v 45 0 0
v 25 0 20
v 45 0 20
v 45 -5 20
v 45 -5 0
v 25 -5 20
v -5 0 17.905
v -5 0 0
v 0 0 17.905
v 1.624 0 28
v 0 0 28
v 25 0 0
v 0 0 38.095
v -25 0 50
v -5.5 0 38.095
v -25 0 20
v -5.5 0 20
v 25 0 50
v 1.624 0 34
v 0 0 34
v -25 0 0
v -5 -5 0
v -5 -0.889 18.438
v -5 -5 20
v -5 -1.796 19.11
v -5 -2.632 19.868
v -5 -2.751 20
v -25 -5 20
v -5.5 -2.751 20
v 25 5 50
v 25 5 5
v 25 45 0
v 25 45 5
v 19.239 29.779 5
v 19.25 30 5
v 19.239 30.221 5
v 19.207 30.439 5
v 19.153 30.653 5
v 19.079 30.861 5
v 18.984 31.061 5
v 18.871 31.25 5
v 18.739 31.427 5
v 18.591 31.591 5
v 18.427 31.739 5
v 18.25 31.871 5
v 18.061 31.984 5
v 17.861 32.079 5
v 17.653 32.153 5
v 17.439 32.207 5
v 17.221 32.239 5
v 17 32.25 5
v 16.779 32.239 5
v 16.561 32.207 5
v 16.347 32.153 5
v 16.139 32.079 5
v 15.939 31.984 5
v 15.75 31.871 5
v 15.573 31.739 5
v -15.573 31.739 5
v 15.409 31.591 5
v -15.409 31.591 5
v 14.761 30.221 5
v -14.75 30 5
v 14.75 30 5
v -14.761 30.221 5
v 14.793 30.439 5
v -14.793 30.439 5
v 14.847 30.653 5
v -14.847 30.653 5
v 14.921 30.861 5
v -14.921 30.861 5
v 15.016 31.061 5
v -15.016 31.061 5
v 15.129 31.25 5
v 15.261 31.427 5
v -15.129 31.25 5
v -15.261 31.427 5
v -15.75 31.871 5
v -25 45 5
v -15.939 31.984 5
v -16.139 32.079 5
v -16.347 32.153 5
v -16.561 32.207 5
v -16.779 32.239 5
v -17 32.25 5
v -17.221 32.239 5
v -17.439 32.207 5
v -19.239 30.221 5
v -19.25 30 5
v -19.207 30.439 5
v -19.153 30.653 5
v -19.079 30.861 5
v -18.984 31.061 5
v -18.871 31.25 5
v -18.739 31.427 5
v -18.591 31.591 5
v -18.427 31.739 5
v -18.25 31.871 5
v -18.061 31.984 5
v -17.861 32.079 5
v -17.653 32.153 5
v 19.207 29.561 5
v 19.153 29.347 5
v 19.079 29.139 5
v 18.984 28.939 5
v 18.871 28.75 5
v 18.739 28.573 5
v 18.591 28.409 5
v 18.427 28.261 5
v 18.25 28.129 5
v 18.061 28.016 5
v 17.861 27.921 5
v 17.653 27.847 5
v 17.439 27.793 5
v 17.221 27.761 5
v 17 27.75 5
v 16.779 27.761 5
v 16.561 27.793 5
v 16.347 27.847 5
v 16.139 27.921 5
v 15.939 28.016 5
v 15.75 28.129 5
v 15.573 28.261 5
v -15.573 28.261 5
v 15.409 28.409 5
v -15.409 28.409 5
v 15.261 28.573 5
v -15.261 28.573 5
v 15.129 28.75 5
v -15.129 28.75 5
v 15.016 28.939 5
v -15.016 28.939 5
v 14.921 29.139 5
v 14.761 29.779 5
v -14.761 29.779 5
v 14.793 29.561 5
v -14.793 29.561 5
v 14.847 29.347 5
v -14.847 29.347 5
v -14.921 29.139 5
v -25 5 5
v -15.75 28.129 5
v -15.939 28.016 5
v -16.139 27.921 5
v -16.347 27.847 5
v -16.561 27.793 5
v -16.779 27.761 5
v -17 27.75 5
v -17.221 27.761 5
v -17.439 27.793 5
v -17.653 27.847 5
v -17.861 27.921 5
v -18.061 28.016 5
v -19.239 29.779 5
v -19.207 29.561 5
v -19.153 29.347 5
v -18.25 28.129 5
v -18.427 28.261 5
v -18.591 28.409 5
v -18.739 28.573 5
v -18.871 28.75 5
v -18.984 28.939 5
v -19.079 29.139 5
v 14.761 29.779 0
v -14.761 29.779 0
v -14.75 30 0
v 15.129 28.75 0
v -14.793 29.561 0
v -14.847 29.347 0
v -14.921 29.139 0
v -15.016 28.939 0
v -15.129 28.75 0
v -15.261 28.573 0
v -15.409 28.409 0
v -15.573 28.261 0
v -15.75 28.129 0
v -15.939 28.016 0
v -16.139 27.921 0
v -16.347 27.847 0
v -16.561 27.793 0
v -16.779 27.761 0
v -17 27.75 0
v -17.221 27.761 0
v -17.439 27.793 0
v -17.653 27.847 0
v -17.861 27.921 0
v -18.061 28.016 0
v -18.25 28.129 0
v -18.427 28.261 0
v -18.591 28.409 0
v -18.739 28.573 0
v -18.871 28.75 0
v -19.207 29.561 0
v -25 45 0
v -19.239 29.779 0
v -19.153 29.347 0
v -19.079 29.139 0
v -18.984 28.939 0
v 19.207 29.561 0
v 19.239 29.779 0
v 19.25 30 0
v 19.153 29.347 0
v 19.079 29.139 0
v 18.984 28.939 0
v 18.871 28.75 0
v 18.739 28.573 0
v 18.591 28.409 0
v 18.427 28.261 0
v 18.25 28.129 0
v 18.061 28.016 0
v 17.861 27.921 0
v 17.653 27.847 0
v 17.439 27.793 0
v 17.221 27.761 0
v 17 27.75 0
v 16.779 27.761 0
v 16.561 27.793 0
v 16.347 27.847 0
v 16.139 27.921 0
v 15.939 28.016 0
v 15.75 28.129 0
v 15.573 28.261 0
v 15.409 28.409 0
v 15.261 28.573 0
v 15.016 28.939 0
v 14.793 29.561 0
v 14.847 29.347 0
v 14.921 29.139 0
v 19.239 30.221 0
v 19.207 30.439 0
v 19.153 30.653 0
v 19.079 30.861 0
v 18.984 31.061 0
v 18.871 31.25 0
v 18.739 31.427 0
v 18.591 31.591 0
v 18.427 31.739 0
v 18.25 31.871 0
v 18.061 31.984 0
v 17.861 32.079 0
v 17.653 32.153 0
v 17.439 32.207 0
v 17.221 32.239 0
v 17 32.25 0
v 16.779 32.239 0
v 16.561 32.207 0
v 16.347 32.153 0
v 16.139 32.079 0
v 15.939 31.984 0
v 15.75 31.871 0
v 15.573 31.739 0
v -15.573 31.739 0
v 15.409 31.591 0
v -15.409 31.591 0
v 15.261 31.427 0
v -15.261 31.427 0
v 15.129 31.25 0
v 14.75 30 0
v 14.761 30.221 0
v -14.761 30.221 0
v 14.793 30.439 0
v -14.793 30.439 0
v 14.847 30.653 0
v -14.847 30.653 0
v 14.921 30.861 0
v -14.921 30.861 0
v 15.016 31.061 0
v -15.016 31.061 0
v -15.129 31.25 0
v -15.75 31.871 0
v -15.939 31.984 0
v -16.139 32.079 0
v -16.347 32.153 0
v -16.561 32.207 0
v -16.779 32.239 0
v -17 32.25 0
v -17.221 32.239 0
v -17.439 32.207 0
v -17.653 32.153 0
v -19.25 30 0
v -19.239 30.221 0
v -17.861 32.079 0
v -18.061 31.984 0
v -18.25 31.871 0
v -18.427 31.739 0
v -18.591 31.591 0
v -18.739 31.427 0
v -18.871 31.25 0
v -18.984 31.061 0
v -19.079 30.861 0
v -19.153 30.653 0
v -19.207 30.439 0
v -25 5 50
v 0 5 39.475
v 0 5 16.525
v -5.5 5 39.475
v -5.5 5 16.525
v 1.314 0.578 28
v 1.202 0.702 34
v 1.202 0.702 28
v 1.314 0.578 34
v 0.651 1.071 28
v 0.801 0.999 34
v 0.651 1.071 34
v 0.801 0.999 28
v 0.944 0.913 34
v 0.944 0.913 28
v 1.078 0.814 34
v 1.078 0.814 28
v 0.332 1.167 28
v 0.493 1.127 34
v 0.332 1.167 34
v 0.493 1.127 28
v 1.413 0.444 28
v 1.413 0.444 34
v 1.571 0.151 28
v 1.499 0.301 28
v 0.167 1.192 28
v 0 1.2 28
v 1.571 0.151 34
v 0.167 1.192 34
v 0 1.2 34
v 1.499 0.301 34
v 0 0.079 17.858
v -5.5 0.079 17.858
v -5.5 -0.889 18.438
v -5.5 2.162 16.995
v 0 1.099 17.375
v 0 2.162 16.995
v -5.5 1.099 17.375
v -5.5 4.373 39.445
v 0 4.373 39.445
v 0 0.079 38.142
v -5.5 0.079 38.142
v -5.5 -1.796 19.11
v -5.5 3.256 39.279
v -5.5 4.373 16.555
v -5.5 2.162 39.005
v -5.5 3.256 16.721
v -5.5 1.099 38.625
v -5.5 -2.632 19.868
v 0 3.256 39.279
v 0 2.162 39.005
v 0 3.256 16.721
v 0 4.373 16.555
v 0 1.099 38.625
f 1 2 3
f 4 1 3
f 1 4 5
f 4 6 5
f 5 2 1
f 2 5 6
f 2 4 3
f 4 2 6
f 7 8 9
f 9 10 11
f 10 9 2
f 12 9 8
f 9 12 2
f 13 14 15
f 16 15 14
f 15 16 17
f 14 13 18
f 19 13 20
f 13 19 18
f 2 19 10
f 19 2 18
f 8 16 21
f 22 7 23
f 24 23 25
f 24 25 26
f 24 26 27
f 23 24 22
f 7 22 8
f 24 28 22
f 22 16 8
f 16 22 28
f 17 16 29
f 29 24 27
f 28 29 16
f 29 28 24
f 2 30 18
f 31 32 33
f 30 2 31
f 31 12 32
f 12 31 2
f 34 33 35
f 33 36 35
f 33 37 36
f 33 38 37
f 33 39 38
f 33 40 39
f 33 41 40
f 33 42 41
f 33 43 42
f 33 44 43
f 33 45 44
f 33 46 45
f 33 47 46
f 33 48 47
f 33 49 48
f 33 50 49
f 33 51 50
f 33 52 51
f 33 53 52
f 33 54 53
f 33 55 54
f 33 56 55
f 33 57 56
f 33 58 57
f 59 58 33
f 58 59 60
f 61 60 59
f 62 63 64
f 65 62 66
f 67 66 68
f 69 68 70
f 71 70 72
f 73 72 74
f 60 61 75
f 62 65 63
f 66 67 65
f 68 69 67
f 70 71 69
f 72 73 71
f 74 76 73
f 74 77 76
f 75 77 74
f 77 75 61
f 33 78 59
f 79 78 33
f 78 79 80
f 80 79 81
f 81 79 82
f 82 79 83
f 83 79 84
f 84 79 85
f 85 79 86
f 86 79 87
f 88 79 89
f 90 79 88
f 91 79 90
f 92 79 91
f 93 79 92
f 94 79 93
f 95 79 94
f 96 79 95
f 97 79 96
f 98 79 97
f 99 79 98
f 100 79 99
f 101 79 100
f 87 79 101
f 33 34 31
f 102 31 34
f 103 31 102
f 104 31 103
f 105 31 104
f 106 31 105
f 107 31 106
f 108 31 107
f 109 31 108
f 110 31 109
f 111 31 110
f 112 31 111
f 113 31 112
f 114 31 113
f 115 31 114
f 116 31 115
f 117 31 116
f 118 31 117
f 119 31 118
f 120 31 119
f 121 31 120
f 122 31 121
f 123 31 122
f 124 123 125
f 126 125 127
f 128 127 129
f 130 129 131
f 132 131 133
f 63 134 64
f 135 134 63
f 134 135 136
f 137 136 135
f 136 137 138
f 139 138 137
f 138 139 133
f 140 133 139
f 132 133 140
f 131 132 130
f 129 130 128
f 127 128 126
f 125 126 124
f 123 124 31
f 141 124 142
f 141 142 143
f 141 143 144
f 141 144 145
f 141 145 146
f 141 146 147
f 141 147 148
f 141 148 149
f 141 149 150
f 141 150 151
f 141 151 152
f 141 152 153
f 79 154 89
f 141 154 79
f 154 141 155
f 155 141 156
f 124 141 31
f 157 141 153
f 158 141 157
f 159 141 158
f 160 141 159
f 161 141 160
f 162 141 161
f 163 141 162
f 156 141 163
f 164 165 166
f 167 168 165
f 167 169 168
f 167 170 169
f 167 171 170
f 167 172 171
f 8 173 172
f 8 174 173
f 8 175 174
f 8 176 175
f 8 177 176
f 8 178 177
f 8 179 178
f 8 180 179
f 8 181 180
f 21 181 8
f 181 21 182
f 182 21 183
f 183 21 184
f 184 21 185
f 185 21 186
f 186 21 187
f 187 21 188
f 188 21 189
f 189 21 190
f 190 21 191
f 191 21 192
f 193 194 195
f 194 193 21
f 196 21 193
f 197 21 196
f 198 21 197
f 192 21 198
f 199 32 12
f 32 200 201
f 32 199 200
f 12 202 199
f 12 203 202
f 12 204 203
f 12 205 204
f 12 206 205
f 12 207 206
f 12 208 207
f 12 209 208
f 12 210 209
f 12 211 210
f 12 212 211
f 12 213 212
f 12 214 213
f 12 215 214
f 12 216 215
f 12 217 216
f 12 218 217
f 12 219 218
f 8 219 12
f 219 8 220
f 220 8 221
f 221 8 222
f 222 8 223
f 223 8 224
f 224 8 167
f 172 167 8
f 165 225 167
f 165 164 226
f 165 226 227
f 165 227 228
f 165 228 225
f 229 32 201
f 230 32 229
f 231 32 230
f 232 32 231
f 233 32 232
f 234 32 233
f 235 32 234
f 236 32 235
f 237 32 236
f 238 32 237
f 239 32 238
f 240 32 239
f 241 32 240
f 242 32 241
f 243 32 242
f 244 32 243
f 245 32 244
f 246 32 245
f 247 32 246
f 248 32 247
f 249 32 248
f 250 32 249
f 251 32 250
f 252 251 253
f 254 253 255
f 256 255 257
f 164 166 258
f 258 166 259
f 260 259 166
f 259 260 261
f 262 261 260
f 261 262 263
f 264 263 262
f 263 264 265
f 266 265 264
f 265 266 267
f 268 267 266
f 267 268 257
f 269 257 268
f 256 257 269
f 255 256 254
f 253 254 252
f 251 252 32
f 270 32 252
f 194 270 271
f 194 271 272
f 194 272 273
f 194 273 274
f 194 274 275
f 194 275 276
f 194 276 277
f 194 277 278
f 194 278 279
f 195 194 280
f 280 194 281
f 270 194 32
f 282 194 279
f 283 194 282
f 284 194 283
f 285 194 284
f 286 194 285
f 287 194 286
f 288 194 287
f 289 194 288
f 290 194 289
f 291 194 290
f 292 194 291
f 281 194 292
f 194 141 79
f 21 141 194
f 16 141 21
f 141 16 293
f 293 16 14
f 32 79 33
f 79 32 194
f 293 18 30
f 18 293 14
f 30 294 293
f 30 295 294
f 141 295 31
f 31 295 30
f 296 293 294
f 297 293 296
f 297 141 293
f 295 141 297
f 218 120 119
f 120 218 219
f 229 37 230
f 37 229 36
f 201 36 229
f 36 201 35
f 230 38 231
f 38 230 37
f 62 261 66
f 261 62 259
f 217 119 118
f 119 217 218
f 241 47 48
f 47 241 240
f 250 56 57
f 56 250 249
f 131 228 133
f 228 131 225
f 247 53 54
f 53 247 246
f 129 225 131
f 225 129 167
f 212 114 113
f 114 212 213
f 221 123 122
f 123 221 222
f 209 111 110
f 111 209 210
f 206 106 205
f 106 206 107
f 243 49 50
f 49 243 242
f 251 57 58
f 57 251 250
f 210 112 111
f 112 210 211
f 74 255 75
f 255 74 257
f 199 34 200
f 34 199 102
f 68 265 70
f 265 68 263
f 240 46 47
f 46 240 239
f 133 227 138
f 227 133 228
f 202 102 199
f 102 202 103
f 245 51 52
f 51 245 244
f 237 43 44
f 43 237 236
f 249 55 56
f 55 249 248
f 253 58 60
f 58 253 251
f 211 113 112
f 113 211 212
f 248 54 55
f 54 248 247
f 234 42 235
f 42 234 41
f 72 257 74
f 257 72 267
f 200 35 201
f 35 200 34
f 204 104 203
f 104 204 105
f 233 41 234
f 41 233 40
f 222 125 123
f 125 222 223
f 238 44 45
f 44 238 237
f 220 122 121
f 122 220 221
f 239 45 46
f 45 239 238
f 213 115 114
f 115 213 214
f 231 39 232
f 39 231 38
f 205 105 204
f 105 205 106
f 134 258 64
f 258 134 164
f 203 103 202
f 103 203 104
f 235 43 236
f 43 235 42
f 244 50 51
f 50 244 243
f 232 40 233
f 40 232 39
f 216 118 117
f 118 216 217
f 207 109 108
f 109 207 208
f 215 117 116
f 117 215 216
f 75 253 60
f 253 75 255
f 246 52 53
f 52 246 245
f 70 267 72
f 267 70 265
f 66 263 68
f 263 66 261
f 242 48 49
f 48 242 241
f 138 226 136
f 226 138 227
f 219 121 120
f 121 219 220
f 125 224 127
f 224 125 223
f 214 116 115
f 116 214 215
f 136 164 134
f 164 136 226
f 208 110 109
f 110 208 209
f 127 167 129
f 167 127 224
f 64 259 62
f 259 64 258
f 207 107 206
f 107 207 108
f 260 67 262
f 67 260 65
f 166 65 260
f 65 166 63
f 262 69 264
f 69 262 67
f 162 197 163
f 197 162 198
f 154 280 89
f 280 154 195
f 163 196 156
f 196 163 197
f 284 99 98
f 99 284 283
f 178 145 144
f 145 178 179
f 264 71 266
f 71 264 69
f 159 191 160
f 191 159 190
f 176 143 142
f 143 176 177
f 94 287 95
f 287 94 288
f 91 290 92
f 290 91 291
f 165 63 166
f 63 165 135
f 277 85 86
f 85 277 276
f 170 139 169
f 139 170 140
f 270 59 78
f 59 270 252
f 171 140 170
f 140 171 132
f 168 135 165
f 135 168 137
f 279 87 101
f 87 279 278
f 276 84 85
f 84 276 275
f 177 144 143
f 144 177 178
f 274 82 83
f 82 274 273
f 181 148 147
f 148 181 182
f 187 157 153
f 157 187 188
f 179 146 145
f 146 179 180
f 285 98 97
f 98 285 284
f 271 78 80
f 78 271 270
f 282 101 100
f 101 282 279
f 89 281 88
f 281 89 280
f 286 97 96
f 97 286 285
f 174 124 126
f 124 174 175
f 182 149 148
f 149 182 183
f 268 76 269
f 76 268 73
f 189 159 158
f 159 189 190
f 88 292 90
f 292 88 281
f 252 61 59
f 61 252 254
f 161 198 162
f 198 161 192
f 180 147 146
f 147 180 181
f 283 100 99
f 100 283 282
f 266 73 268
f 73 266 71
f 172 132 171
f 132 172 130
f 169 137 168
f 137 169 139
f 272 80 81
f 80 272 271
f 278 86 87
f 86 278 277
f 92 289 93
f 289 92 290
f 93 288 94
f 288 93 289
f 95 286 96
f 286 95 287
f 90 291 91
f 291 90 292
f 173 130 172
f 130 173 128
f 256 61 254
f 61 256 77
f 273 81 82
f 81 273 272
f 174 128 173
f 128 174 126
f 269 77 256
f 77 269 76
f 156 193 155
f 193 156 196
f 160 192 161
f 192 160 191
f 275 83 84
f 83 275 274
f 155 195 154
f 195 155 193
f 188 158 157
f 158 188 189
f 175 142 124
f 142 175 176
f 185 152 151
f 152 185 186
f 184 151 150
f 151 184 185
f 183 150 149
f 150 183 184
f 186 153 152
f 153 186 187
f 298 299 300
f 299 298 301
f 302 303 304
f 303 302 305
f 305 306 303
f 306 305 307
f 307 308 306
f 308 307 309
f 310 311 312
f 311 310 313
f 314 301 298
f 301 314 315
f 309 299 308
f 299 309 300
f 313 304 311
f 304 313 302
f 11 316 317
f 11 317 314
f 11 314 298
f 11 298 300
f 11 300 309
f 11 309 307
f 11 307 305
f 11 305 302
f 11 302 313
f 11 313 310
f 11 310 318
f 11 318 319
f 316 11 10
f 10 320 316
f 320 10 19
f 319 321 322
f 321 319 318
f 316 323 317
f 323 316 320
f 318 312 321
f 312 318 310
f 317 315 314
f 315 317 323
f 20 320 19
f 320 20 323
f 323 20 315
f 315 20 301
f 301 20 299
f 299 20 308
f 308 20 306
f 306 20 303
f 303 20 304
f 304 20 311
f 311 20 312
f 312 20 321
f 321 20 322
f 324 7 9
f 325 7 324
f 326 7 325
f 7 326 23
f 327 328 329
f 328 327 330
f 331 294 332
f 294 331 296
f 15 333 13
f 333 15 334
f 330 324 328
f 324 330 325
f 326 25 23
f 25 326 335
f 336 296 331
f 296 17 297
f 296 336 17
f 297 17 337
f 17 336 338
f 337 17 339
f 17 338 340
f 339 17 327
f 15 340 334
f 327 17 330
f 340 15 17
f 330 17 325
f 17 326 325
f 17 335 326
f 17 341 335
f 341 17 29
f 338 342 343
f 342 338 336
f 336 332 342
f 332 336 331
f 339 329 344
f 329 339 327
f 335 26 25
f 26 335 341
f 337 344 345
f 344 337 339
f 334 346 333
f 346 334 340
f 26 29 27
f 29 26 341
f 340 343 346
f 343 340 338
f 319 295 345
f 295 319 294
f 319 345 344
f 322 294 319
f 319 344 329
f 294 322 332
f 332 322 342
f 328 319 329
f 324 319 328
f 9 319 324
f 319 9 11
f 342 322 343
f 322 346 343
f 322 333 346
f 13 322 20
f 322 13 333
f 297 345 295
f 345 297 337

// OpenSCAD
// L-shaped mounting bracket for NEMA 17 stepper motor (e.g. syringe pump)
// Print orientation: base plate on bed (z = 0), motor plate builds upward.

// ---------------- Parameters ----------------
base_x0      = -25;   // base plate x start
base_x1      = 25;    // base plate x end
base_y0      = 0;     // base plate y start
base_y1      = 45;    // base plate y end
base_t       = 5;     // base plate thickness (Z)

hole_m4_x    = -17;   // M4 through-hole x position
hole_m4_y    = 30;    // M4 through-hole y position
hole_m4_d    = 4.5;   // M4 hole diameter

motor_x0     = -25;   // motor plate x start
motor_x1     = 25;    // motor plate x end
motor_y0     = 0;     // motor plate y start
motor_y1     = 5;     // motor plate y end (thickness)
motor_h      = 50;    // motor plate height (Z)

boss_d       = 23;    // motor centring boss hole diameter
boss_x       = 0;     // boss hole x centre
boss_z       = 28;    // boss hole z centre
boss_h       = 5;     // boss hole depth (along Y)

screw_d      = 3.4;   // M3 screw hole diameter
screw_n      = 4;     // number of screw holes
screw_pitch  = 31;    // square pattern side length
screw_x0     = 0;     // screw pattern centre x
screw_z0     = 28;    // screw pattern centre z

gusset_t     = 5;     // gusset thickness (X)
gusset_leg   = 20;    // right triangle leg length (Y and Z)
gusset_x0    = -25;   // left gusset x start
gusset_x1    = 25;    // right gusset x end

eps          = 0.5;   // cutter overshoot past faces

$fn = 64;

// ---------------- Model ----------------
difference() {
    union() {
        // Base plate
        translate([base_x0, base_y0, 0])
            cube([base_x1 - base_x0, base_y1 - base_y0, base_t]);

        // Motor plate (overlaps base slightly for a solid union)
        translate([motor_x0, motor_y0, 0])
            cube([motor_x1 - motor_x0, motor_y1 - motor_y0, motor_h]);

        // Gussets: right triangle in YZ, flush with plate edges
        for (sx = [-1, 1])
            translate([sx * gusset_x0, 0, 0])
                rotate([90, 0, 0])
                    linear_extrude(height = gusset_t)
                        polygon([
                            [gusset_leg, gusset_leg],
                            [0, gusset_leg],
                            [gusset_leg, 0]
                        ]);
    }

    // Base plate through-holes (M4)
    for (sx = [-1, 1])
        translate([sx * hole_m4_x, hole_m4_y, -eps])
            cylinder(d = hole_m4_d, h = base_t + 2 * eps);

    // Motor boss hole (along Y)
    translate([boss_x, motor_y1 + eps, boss_z])
        rotate([0, -90, 0])
            cylinder(d = boss_d, h = boss_h + eps);

    // M3 screw holes on square pattern through motor plate
    for (i = [0 : screw_n - 1]) {
        x = screw_x0 + (i % 2) * screw_pitch;
        z = screw_z0 + (i / 2) * screw_pitch;
        translate([x, motor_y0 - eps, z])
            cylinder(d = screw_d, h = motor_y1 + 2 * eps);
    }
}
